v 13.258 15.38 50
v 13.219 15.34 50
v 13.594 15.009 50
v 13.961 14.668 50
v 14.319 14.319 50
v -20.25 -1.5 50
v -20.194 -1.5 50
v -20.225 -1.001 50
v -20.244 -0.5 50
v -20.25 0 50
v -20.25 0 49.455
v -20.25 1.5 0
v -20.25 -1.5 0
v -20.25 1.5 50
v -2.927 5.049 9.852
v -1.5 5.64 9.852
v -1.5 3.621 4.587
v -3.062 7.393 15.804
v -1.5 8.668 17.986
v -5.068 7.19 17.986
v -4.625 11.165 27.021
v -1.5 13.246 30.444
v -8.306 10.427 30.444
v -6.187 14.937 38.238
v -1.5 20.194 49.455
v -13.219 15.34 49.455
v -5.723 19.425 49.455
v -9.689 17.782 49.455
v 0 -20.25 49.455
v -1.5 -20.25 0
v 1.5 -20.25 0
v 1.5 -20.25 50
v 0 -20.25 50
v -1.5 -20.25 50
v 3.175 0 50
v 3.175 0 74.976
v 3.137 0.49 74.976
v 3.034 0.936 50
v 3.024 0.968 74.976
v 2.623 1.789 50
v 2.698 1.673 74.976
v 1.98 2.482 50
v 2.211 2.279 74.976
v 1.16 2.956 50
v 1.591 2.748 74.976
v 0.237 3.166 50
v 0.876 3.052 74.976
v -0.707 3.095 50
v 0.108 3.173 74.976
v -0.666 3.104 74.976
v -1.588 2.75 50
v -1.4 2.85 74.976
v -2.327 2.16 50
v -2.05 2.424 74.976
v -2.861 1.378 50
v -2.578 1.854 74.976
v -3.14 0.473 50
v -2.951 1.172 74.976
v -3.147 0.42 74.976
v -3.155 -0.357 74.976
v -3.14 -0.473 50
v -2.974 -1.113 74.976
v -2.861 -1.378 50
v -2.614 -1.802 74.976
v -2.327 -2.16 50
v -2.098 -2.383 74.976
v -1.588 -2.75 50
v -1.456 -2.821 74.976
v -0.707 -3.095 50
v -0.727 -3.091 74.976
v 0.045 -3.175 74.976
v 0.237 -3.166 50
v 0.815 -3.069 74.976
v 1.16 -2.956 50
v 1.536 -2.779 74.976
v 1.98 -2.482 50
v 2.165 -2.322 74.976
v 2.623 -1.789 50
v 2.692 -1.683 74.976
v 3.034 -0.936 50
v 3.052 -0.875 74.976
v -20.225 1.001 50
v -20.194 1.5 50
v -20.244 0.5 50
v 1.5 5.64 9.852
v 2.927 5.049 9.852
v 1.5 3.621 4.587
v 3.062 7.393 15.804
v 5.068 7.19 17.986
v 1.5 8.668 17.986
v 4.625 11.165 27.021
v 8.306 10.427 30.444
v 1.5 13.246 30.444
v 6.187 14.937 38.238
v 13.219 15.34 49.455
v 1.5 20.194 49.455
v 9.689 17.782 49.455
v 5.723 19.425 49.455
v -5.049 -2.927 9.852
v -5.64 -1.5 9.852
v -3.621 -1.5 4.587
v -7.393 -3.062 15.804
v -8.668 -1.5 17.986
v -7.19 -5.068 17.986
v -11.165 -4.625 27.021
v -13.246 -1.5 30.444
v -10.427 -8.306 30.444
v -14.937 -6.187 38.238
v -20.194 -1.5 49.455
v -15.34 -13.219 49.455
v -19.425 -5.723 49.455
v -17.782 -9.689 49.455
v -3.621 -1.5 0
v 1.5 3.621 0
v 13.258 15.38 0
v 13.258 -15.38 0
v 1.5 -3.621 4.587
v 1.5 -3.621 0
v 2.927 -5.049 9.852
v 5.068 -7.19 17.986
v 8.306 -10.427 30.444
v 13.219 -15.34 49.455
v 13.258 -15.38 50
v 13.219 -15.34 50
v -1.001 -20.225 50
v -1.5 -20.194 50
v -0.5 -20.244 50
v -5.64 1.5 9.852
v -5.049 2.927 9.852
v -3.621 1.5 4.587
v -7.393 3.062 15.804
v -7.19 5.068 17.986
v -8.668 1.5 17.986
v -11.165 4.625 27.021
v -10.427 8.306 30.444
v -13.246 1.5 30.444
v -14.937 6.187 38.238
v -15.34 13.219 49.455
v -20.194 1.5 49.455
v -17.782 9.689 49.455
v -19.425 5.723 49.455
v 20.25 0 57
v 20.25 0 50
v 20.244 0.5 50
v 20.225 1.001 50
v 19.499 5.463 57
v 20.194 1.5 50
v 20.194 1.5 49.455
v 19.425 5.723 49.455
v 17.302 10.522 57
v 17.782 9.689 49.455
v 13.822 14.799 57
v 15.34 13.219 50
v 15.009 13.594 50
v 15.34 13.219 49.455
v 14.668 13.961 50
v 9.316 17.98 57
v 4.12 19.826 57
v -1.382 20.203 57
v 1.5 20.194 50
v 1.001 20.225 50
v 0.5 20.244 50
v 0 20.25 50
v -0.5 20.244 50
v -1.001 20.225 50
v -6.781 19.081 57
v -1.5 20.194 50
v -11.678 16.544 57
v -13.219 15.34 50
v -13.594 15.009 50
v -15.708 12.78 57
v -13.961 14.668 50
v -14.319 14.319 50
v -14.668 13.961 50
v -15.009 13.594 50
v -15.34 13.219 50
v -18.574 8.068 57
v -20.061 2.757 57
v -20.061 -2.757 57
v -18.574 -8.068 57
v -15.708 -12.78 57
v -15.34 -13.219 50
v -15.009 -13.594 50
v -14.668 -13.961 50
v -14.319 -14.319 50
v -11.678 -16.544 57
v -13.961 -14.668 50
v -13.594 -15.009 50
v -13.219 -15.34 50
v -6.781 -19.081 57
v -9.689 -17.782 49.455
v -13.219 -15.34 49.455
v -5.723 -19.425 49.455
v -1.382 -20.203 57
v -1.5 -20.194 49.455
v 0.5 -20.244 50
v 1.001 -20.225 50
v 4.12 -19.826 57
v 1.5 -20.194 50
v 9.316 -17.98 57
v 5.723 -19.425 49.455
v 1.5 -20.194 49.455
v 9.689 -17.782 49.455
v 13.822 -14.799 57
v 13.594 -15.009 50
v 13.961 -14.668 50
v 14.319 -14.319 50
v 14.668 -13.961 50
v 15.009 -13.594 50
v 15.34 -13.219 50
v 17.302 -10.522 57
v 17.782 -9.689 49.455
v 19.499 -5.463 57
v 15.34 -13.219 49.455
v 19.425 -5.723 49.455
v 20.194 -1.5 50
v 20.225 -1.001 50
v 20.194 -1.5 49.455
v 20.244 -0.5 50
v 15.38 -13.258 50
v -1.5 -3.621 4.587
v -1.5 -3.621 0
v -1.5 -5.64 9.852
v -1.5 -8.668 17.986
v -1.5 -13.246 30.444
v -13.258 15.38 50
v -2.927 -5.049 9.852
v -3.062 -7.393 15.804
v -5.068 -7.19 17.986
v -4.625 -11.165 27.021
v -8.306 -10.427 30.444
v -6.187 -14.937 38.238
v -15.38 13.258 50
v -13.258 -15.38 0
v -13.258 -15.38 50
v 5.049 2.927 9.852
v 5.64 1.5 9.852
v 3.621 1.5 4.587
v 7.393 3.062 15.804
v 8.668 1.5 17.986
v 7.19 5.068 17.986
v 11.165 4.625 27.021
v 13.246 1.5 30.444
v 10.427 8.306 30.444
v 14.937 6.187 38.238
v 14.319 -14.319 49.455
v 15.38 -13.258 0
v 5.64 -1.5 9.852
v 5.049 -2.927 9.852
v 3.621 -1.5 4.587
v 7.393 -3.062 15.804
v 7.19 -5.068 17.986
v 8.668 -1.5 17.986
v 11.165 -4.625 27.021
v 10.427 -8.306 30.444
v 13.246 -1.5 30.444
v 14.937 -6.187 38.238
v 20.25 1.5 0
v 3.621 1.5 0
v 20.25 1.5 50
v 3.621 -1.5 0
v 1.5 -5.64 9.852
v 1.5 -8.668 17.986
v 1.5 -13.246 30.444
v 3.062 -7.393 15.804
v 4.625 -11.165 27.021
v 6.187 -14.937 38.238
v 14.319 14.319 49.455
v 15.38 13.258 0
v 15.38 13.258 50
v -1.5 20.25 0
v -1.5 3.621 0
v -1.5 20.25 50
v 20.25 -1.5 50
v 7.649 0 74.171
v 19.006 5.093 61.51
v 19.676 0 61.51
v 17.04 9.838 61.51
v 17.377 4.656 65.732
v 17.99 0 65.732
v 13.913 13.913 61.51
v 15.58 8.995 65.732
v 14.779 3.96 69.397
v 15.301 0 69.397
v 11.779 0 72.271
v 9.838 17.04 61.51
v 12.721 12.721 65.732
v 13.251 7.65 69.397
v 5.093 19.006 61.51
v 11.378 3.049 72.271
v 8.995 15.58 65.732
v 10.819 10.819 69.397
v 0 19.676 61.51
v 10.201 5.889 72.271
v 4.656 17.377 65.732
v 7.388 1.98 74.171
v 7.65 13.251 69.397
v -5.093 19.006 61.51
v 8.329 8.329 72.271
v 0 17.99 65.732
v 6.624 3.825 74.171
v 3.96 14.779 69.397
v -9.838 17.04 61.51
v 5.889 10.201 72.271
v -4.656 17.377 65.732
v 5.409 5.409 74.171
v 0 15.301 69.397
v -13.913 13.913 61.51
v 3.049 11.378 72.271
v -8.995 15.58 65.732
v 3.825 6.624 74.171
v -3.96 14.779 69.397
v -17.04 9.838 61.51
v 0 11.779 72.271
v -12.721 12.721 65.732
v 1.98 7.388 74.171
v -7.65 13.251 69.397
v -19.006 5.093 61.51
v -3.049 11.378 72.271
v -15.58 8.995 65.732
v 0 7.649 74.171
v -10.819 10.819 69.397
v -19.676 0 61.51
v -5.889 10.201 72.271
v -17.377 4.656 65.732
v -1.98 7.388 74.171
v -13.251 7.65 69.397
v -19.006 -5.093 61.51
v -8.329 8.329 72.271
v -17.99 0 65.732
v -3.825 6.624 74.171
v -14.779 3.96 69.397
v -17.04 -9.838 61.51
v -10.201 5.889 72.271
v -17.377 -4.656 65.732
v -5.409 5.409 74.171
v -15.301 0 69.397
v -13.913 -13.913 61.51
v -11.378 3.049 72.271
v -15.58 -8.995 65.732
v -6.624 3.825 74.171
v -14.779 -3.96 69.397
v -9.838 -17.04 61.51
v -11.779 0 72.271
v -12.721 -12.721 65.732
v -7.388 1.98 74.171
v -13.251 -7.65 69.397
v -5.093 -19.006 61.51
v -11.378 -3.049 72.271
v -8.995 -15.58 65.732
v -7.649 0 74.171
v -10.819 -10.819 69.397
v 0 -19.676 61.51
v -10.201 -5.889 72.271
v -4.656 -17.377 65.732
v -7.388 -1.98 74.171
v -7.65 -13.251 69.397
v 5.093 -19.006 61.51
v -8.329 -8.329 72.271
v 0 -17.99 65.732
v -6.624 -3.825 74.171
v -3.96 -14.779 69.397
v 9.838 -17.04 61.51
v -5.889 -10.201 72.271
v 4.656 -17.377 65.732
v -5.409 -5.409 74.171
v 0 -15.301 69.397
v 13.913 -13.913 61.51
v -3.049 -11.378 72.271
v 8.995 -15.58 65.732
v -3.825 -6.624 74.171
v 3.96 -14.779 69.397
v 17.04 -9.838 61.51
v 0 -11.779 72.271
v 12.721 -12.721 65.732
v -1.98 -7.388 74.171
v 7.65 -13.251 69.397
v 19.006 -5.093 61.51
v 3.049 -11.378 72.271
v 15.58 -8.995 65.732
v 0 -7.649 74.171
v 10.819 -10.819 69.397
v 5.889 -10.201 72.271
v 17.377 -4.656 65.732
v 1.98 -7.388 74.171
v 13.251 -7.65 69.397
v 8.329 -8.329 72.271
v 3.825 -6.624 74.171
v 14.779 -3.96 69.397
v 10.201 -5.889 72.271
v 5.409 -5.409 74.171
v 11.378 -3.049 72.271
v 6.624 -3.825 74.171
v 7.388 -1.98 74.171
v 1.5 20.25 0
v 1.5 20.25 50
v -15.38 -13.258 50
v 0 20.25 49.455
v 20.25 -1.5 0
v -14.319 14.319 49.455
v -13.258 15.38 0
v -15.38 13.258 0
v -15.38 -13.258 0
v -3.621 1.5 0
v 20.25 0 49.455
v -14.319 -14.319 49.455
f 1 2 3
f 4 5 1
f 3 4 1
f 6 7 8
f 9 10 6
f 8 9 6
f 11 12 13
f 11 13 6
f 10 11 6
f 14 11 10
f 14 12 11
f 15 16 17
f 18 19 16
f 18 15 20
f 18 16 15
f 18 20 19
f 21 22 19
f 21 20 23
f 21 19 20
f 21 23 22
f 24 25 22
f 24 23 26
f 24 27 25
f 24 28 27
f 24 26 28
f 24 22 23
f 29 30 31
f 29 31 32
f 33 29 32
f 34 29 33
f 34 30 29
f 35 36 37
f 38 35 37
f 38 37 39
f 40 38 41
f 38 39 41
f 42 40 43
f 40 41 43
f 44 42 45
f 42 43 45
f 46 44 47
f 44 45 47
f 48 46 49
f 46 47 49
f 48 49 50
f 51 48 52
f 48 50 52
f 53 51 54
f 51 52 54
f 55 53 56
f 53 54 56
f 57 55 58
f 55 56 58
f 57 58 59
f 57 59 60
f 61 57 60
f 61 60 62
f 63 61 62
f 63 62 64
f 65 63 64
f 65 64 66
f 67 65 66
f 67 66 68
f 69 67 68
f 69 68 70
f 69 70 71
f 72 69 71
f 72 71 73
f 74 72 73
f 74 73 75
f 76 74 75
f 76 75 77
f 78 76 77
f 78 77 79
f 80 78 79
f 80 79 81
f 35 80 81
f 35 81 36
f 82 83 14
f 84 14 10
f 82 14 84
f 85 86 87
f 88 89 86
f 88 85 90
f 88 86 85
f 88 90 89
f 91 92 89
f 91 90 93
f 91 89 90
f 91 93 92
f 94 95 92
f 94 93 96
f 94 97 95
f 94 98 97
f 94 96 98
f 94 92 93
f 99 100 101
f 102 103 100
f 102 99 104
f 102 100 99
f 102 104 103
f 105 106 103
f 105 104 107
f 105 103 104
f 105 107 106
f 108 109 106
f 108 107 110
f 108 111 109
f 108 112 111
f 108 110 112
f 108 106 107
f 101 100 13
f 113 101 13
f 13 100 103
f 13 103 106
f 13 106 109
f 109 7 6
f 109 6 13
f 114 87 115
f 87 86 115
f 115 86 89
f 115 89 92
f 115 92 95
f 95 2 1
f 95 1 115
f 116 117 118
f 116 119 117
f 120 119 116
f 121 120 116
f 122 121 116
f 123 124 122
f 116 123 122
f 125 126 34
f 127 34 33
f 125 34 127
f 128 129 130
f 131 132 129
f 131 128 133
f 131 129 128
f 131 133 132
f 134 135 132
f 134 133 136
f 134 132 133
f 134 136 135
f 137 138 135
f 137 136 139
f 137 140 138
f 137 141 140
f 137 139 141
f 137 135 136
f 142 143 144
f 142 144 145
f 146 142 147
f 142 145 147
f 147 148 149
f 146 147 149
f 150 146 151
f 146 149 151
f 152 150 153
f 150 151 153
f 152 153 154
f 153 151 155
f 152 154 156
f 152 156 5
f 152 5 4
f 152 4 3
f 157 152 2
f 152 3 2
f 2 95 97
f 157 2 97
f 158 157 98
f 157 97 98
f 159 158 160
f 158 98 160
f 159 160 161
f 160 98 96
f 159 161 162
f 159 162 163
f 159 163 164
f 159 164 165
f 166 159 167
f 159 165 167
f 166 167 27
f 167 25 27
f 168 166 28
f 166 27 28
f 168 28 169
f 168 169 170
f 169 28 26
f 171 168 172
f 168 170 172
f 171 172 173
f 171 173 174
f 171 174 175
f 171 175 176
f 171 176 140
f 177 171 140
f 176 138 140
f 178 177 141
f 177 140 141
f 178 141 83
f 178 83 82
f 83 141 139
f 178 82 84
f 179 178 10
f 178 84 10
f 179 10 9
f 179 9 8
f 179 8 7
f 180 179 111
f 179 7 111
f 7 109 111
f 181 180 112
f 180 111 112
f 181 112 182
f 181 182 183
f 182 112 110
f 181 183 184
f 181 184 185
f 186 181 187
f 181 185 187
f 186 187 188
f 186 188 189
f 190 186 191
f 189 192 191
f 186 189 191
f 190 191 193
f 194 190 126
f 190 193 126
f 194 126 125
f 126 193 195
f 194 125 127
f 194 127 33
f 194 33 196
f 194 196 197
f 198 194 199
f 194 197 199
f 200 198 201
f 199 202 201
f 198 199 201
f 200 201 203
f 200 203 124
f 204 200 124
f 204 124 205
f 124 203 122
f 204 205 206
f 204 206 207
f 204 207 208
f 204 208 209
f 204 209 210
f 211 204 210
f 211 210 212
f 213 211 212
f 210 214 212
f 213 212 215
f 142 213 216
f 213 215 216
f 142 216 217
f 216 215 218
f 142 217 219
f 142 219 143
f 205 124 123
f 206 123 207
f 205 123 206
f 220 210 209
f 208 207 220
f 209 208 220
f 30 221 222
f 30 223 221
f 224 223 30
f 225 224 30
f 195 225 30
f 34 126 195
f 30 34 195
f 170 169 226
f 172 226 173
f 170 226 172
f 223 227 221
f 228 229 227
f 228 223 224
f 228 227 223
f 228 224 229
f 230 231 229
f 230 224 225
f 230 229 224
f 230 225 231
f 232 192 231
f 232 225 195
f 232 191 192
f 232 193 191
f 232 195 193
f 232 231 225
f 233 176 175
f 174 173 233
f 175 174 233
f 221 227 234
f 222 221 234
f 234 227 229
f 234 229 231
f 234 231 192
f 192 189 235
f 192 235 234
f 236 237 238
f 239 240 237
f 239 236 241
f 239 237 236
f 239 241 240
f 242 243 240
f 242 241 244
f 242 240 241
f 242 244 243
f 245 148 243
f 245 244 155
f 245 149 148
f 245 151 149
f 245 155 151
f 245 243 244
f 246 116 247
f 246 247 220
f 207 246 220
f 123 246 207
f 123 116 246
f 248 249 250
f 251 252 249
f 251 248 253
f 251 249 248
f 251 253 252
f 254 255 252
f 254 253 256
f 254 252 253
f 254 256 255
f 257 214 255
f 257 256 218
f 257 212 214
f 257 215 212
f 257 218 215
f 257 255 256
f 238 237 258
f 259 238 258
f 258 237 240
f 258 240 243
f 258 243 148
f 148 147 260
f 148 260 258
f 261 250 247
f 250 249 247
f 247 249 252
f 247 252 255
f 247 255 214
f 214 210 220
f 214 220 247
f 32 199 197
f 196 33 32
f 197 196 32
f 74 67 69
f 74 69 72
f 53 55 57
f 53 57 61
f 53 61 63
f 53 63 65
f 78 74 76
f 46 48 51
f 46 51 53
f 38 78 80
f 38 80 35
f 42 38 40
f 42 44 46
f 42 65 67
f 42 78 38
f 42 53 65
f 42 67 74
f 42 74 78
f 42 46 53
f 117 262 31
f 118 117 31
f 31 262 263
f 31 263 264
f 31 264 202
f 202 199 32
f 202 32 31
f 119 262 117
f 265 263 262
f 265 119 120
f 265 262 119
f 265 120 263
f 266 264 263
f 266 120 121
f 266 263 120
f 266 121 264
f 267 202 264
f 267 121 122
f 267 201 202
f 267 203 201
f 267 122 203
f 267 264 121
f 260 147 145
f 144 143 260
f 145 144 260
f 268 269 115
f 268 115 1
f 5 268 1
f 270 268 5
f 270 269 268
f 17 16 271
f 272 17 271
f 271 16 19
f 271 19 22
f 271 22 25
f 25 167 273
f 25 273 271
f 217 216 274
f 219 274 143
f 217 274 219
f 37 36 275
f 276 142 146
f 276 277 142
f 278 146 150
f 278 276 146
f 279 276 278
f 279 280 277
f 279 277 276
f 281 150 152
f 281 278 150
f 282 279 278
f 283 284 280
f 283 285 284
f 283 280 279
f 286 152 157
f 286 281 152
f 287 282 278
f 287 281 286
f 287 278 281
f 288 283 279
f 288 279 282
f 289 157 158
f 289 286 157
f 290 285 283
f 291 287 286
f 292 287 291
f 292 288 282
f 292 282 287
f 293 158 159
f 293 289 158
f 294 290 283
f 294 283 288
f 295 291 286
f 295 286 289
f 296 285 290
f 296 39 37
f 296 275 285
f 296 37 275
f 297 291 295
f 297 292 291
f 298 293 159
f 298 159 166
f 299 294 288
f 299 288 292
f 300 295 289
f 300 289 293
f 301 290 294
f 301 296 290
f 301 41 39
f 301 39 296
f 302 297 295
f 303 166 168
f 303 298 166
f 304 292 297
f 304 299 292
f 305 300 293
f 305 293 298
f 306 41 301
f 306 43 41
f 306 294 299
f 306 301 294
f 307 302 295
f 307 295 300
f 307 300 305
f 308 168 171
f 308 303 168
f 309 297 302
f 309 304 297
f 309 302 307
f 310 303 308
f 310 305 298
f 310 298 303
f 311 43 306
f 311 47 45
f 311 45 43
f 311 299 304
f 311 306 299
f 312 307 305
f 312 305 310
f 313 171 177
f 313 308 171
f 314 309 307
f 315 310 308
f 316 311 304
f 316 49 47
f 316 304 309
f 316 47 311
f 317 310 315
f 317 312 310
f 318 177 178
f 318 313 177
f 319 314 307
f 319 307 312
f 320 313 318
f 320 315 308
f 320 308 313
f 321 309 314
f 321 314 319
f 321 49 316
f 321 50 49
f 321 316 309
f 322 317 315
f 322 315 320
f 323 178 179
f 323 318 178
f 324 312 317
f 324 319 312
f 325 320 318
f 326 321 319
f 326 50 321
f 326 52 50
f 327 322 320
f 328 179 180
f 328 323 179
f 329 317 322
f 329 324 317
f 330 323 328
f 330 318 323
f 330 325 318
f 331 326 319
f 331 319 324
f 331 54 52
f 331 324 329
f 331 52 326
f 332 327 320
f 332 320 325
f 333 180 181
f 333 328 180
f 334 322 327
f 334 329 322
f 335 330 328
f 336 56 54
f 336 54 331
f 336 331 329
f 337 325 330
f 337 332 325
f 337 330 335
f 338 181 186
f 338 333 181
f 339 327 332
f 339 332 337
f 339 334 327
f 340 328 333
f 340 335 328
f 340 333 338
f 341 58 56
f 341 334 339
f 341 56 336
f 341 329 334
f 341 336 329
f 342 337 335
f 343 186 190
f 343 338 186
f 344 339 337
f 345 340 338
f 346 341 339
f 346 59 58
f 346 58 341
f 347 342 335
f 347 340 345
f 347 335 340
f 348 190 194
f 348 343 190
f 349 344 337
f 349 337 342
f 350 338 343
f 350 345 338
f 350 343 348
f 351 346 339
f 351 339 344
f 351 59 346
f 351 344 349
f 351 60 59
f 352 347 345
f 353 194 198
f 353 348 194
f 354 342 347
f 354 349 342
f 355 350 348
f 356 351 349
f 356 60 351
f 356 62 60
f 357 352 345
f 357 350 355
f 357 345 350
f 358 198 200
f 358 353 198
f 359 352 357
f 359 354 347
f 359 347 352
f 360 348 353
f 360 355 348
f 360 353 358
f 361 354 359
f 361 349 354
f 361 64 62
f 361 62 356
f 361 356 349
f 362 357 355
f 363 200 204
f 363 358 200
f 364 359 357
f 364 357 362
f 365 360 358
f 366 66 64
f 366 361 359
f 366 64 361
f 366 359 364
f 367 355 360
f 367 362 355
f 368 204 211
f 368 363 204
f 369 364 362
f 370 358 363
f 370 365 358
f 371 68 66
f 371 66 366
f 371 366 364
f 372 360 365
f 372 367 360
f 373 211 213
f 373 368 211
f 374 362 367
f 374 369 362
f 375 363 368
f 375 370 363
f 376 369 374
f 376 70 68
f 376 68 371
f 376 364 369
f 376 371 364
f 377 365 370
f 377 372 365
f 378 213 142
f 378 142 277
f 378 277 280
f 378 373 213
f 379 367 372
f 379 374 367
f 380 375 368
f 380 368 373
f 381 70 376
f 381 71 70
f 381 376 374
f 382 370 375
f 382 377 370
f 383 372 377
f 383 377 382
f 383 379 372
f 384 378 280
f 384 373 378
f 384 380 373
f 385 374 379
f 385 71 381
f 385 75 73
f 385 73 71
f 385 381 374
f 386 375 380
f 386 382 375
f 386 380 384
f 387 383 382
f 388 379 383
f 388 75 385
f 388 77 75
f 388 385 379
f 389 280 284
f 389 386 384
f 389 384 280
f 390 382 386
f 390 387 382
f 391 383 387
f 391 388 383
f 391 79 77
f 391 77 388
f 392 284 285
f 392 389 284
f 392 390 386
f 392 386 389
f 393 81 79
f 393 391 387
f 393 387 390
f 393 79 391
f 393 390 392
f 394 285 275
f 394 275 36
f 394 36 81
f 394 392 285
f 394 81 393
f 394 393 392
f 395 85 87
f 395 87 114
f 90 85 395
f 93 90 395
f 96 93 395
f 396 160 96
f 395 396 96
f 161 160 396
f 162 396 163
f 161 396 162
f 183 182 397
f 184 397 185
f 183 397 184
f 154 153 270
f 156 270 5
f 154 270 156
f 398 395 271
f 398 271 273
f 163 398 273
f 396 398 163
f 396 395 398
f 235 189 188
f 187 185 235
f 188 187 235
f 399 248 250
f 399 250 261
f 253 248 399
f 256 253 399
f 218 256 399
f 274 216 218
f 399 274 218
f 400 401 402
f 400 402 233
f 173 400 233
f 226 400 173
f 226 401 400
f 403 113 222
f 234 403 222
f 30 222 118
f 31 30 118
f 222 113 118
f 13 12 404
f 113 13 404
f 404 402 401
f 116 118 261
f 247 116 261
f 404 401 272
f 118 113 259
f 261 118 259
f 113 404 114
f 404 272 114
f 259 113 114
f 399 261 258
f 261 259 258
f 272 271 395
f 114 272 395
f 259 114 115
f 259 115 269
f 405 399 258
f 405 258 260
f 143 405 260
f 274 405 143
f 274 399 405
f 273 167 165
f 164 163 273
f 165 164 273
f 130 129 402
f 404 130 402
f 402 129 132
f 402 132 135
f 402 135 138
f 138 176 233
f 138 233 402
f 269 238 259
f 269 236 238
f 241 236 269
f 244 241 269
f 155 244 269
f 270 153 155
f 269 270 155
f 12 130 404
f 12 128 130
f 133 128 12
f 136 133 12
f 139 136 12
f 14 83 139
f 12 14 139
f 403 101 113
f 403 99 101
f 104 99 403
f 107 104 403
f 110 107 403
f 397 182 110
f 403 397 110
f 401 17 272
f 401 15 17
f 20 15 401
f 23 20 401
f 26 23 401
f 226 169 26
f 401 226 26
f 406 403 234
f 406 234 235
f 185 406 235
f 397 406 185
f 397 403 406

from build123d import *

# Parameters (mm, degrees)
F0_R      = 20.25
F1_DEPTH  = 75
F2_SIZE2  = 49.4545935502
F2_SIZE   = 18
F3_R      = 18
F7_E11_W  = 20.25
F7_E11_H  = 50
F14_DEPTH = 1.5
F9_E17_W  = 20.25
F9_E17_H  = 50
F15_DEPTH = 1.5
F9_E13_W  = 20.25
F9_E13_H  = 50
F16_DEPTH = 1.5
F11_E21_W = 20.25
F11_E21_H = 50
F17_DEPTH = 1.5
F11_E20_W = 20.25
F11_E20_H = 50
F18_DEPTH = 1.5
F13_E23_W = 20.25
F13_E23_H = 50
F19_DEPTH = 1.5
F5_E6_W   = 20.25
F5_E6_H   = 50
F20_DEPTH = 1.5
F13_E24_W = 20.25
F13_E24_H = 50
F21_DEPTH = 1.5
F22_R     = 3.175
F22_R_2   = 2.25
F23_DEPTH = 25


with BuildPart() as f1:
    # F0 (on Top) → F1 (new body)
    with BuildSketch(Plane.XY):
        Circle(F0_R)
    extrude(amount=F1_DEPTH)

    # F2
    f2_edges = [f1.edges().sort_by_distance(p)[0] for p in [
        (-20.25, 0, 0),
    ]]
    f2_side = f1.faces().sort_by_distance((0, 0, 0))[0]
    chamfer(f2_edges, length=F2_SIZE, length2=F2_SIZE2, reference=f2_side)

    # F3
    f3_edges = [f1.edges().sort_by_distance(p)[0] for p in [
        (-20.25, 0, 75),
    ]]
    fillet(f3_edges, radius=F3_R)

    # F7_E11 (on explicit) → F14 (join, symmetric)
    with BuildSketch(Plane.YZ):
        with Locations((10.125, 25)):
            Rectangle(F7_E11_W, F7_E11_H)
    extrude(amount=F14_DEPTH, both=True)

    # F9_E17 (on explicit) → F15 (join, symmetric)
    with BuildSketch(Plane(origin=(0, 0, 0), x_dir=(-0.7071067812, 0.7071067812, 0), z_dir=(0.7071067812, 0.7071067812, 0))):
        with Locations((10.125, 25)):
            Rectangle(F9_E17_W, F9_E17_H)
    extrude(amount=F15_DEPTH, both=True)

    # F9_E13 (on explicit) → F16 (join, symmetric)
    with BuildSketch(Plane(origin=(0, 0, 0), x_dir=(-1, 0, 0), z_dir=(0, 1, 0))):
        with Locations((10.125, 25)):
            Rectangle(F9_E13_W, F9_E13_H)
    extrude(amount=F16_DEPTH, both=True)

    # F11_E21 (on explicit) → F17 (join, symmetric)
    with BuildSketch(Plane(origin=(0, 0, 0), x_dir=(-0.7071067812, -0.7071067812, 0), z_dir=(-0.7071067812, 0.7071067812, 0))):
        with Locations((10.125, 25)):
            Rectangle(F11_E21_W, F11_E21_H)
    extrude(amount=F17_DEPTH, both=True)

    # F11_E20 (on explicit) → F18 (join, symmetric)
    with BuildSketch(Plane(origin=(0, 0, 0), x_dir=(0, -1, 0), z_dir=(-1, 0, 0))):
        with Locations((10.125, 25)):
            Rectangle(F11_E20_W, F11_E20_H)
    extrude(amount=F18_DEPTH, both=True)

    # F13_E23 (on explicit) → F19 (join, symmetric)
    with BuildSketch(Plane.XZ):
        with Locations((10.125, 25)):
            Rectangle(F13_E23_W, F13_E23_H)
    extrude(amount=F19_DEPTH, both=True)

    # F5_E6 (on explicit) → F20 (join, symmetric)
    with BuildSketch(Plane(origin=(0, 0, 0), x_dir=(0.7071067812, -0.7071067812, 0), z_dir=(-0.7071067812, -0.7071067812, 0))):
        with Locations((10.125, 25)):
            Rectangle(F5_E6_W, F5_E6_H)
    extrude(amount=F20_DEPTH, both=True)

    # F13_E24 (on explicit) → F21 (join, symmetric)
    with BuildSketch(Plane(origin=(0, 0, 0), x_dir=(0.7071067812, 0.7071067812, 0), z_dir=(0.7071067812, -0.7071067812, 0))):
        with Locations((10.125, 25)):
            Rectangle(F13_E24_W, F13_E24_H)
    extrude(amount=F21_DEPTH, both=True)

    # F22 (on face) → F23 (cut)
    with BuildSketch(Plane.XY.offset(75)):
        Circle(F22_R)
        Circle(F22_R_2, mode=Mode.SUBTRACT)
        Circle(F22_R_2)
    extrude(amount=-F23_DEPTH, mode=Mode.SUBTRACT)


solid = f1.part
